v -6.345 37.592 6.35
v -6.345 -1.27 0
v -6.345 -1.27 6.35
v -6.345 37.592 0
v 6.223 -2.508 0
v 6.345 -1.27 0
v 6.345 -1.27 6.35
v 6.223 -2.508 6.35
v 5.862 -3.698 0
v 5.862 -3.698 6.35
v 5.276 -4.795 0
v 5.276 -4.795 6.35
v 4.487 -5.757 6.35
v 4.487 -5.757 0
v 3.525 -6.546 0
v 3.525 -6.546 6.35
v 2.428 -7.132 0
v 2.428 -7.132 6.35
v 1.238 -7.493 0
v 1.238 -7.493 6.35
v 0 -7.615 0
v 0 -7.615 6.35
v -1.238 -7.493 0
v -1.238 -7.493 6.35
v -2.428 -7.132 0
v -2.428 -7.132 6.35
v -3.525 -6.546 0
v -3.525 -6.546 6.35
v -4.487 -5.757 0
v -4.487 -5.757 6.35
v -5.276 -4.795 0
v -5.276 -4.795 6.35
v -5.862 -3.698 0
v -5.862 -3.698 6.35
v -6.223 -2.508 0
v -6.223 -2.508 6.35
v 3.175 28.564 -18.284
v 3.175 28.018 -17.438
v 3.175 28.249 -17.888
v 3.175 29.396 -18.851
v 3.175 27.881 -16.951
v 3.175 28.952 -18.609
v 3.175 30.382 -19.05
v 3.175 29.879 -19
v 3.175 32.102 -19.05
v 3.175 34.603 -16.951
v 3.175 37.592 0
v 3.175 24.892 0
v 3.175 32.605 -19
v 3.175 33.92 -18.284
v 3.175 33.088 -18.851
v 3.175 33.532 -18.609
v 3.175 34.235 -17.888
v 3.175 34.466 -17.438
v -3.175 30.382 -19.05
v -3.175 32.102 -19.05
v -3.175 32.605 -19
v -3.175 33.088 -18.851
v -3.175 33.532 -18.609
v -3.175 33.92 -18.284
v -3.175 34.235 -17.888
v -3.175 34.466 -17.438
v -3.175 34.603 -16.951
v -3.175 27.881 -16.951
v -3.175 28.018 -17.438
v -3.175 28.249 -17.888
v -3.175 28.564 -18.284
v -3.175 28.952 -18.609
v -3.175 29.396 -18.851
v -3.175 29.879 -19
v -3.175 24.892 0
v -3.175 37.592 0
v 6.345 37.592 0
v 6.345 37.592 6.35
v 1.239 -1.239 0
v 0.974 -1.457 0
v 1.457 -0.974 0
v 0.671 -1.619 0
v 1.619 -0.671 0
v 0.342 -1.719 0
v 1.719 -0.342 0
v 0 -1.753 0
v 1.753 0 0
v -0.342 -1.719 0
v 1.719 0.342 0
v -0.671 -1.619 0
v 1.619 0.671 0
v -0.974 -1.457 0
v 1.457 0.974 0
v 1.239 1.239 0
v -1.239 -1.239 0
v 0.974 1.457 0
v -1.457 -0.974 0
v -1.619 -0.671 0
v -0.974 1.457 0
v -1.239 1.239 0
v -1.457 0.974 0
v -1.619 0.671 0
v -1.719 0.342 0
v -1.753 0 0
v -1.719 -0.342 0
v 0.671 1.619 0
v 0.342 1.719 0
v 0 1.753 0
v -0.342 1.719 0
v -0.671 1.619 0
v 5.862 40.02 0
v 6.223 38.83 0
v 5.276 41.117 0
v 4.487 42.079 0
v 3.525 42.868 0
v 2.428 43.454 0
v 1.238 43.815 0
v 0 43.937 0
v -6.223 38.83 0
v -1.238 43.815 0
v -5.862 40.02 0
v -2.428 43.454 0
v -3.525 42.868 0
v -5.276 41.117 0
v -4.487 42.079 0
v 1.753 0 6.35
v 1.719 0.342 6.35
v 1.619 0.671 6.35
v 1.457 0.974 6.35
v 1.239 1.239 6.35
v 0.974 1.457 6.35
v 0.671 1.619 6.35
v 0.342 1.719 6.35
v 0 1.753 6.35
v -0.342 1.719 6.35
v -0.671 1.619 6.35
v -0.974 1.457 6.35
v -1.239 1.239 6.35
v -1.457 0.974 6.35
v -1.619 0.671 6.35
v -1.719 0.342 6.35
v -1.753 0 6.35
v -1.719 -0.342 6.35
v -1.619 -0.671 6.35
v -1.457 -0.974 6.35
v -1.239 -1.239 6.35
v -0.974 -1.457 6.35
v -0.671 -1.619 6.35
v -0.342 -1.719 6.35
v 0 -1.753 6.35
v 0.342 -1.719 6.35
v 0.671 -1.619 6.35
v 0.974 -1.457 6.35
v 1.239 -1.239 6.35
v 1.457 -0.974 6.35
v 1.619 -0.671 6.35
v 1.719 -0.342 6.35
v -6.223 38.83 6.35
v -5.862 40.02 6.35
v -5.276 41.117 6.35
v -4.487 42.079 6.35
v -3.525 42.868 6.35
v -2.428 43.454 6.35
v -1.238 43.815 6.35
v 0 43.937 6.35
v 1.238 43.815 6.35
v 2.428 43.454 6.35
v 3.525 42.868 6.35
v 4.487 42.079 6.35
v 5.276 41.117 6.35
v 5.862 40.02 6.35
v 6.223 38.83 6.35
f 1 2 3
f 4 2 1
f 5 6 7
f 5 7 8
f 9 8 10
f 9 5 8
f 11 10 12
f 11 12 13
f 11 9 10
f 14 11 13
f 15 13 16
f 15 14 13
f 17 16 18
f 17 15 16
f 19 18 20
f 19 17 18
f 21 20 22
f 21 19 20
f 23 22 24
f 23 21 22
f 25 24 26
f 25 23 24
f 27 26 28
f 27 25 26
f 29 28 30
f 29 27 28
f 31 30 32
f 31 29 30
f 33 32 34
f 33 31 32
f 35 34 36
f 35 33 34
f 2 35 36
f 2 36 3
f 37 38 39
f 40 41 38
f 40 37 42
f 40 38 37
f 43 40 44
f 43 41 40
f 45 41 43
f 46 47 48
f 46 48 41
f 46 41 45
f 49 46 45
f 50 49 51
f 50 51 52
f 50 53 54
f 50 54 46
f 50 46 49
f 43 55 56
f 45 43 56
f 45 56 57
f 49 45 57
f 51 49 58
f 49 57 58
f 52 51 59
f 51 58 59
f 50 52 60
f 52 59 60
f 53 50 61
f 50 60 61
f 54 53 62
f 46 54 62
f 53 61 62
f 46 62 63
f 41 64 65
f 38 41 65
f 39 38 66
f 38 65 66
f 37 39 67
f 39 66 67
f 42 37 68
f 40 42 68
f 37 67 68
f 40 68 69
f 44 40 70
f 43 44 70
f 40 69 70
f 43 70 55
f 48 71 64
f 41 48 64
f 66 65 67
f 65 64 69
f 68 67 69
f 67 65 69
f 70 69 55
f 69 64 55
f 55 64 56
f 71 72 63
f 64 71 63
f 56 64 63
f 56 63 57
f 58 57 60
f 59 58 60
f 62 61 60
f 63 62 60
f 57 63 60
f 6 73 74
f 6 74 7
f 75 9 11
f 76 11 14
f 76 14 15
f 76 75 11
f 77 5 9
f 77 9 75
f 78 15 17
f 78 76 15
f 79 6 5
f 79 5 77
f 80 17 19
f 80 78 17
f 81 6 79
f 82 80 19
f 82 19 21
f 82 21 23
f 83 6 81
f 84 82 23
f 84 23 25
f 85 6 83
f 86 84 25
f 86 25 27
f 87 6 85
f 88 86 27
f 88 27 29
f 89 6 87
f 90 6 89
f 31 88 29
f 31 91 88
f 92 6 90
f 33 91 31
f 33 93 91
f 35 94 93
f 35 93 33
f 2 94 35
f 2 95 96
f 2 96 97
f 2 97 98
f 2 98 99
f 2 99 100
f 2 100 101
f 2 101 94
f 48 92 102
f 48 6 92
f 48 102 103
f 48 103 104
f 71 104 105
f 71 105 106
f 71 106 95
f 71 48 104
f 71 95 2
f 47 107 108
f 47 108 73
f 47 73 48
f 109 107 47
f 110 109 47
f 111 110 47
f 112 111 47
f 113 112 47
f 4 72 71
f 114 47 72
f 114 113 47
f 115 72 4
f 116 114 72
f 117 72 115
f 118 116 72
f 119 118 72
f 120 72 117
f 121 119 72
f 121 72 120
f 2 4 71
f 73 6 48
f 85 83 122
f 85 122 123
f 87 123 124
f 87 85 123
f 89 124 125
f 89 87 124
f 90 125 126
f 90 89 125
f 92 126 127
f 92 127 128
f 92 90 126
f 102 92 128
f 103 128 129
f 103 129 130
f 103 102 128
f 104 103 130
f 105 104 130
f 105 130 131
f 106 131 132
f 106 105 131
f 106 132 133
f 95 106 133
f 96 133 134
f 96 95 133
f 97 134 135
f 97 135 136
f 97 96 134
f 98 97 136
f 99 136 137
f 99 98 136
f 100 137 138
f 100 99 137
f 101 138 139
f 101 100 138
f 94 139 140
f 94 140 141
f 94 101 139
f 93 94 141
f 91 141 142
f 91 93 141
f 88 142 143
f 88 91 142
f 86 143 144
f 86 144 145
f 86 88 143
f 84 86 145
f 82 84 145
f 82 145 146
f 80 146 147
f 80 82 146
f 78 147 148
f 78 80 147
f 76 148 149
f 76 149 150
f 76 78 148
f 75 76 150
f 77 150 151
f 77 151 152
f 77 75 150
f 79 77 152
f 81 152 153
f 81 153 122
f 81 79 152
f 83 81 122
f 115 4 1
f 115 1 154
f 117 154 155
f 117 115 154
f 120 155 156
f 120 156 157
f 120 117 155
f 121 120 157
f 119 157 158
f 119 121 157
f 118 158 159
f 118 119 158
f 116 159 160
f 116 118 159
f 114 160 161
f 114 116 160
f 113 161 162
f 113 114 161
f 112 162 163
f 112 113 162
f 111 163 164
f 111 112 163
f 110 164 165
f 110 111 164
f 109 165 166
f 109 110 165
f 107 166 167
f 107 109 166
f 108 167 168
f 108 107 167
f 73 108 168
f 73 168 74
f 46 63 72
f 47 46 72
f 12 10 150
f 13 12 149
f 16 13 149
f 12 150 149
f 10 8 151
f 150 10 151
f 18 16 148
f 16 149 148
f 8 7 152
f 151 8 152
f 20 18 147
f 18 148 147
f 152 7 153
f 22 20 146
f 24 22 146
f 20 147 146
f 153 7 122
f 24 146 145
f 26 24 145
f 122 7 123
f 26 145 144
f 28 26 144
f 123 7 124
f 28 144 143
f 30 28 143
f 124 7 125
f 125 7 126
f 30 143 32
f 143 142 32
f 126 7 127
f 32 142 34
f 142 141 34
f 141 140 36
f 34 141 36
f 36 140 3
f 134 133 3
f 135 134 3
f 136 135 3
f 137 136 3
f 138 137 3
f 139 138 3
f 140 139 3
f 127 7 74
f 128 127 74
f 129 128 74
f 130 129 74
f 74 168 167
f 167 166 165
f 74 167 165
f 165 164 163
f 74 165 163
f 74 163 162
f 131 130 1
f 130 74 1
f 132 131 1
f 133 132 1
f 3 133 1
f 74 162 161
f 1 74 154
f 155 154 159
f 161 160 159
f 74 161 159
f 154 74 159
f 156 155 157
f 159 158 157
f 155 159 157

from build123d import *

# Parameters (mm, degrees)
SKETCH1_R                = 1.7526
BOSS_EXTRUDE1_DEPTH      = 6.35
BOSS_EXTRUDE2_DEPTH      = 3.175
BOSS_EXTRUDE2_DEPTH_BACK = 3.175


with BuildPart() as part:
    # Sketch1 → Boss-Extrude1 (new body)
    with BuildSketch(Plane.XY):
        with BuildLine():
            Line((-6.345006919, -1.27), (-6.345006919, 37.592))
            ThreePointArc((-6.345006919, 37.592), (0, 43.937006919), (6.345006919, 37.592))
            Line((6.345006919, 37.592), (6.345006919, -1.27))
            ThreePointArc((6.345006919, -1.27), (0, -7.615006919), (-6.345006919, -1.27))
        make_face()
        Circle(SKETCH1_R, mode=Mode.SUBTRACT)
    extrude(amount=BOSS_EXTRUDE1_DEPTH)

    # Sketch2 → Boss-Extrude2 (add, two sides: drawn at the far end of the back side and taken through both)
    with BuildSketch(Plane(origin=(0, 0, 0), x_dir=(0, 0, -1), z_dir=(1, 0, 0)).offset(-BOSS_EXTRUDE2_DEPTH_BACK)):
        with BuildLine():
            Line((0, 37.592), (0, 24.892))
            Line((0, 24.892), (16.951066371, 27.880930353))
            ThreePointArc((16.951066371, 27.880930353), (18.455752886, 28.749661517), (19.05, 30.382342046))
            Line((19.05, 30.382342046), (19.05, 32.101657954))
            ThreePointArc((19.05, 32.101657954), (18.455752886, 33.734338483), (16.951066371, 34.603069647))
            Line((16.951066371, 34.603069647), (0, 37.592))
        make_face()
    extrude(amount=BOSS_EXTRUDE2_DEPTH + BOSS_EXTRUDE2_DEPTH_BACK)


solid = part.part
